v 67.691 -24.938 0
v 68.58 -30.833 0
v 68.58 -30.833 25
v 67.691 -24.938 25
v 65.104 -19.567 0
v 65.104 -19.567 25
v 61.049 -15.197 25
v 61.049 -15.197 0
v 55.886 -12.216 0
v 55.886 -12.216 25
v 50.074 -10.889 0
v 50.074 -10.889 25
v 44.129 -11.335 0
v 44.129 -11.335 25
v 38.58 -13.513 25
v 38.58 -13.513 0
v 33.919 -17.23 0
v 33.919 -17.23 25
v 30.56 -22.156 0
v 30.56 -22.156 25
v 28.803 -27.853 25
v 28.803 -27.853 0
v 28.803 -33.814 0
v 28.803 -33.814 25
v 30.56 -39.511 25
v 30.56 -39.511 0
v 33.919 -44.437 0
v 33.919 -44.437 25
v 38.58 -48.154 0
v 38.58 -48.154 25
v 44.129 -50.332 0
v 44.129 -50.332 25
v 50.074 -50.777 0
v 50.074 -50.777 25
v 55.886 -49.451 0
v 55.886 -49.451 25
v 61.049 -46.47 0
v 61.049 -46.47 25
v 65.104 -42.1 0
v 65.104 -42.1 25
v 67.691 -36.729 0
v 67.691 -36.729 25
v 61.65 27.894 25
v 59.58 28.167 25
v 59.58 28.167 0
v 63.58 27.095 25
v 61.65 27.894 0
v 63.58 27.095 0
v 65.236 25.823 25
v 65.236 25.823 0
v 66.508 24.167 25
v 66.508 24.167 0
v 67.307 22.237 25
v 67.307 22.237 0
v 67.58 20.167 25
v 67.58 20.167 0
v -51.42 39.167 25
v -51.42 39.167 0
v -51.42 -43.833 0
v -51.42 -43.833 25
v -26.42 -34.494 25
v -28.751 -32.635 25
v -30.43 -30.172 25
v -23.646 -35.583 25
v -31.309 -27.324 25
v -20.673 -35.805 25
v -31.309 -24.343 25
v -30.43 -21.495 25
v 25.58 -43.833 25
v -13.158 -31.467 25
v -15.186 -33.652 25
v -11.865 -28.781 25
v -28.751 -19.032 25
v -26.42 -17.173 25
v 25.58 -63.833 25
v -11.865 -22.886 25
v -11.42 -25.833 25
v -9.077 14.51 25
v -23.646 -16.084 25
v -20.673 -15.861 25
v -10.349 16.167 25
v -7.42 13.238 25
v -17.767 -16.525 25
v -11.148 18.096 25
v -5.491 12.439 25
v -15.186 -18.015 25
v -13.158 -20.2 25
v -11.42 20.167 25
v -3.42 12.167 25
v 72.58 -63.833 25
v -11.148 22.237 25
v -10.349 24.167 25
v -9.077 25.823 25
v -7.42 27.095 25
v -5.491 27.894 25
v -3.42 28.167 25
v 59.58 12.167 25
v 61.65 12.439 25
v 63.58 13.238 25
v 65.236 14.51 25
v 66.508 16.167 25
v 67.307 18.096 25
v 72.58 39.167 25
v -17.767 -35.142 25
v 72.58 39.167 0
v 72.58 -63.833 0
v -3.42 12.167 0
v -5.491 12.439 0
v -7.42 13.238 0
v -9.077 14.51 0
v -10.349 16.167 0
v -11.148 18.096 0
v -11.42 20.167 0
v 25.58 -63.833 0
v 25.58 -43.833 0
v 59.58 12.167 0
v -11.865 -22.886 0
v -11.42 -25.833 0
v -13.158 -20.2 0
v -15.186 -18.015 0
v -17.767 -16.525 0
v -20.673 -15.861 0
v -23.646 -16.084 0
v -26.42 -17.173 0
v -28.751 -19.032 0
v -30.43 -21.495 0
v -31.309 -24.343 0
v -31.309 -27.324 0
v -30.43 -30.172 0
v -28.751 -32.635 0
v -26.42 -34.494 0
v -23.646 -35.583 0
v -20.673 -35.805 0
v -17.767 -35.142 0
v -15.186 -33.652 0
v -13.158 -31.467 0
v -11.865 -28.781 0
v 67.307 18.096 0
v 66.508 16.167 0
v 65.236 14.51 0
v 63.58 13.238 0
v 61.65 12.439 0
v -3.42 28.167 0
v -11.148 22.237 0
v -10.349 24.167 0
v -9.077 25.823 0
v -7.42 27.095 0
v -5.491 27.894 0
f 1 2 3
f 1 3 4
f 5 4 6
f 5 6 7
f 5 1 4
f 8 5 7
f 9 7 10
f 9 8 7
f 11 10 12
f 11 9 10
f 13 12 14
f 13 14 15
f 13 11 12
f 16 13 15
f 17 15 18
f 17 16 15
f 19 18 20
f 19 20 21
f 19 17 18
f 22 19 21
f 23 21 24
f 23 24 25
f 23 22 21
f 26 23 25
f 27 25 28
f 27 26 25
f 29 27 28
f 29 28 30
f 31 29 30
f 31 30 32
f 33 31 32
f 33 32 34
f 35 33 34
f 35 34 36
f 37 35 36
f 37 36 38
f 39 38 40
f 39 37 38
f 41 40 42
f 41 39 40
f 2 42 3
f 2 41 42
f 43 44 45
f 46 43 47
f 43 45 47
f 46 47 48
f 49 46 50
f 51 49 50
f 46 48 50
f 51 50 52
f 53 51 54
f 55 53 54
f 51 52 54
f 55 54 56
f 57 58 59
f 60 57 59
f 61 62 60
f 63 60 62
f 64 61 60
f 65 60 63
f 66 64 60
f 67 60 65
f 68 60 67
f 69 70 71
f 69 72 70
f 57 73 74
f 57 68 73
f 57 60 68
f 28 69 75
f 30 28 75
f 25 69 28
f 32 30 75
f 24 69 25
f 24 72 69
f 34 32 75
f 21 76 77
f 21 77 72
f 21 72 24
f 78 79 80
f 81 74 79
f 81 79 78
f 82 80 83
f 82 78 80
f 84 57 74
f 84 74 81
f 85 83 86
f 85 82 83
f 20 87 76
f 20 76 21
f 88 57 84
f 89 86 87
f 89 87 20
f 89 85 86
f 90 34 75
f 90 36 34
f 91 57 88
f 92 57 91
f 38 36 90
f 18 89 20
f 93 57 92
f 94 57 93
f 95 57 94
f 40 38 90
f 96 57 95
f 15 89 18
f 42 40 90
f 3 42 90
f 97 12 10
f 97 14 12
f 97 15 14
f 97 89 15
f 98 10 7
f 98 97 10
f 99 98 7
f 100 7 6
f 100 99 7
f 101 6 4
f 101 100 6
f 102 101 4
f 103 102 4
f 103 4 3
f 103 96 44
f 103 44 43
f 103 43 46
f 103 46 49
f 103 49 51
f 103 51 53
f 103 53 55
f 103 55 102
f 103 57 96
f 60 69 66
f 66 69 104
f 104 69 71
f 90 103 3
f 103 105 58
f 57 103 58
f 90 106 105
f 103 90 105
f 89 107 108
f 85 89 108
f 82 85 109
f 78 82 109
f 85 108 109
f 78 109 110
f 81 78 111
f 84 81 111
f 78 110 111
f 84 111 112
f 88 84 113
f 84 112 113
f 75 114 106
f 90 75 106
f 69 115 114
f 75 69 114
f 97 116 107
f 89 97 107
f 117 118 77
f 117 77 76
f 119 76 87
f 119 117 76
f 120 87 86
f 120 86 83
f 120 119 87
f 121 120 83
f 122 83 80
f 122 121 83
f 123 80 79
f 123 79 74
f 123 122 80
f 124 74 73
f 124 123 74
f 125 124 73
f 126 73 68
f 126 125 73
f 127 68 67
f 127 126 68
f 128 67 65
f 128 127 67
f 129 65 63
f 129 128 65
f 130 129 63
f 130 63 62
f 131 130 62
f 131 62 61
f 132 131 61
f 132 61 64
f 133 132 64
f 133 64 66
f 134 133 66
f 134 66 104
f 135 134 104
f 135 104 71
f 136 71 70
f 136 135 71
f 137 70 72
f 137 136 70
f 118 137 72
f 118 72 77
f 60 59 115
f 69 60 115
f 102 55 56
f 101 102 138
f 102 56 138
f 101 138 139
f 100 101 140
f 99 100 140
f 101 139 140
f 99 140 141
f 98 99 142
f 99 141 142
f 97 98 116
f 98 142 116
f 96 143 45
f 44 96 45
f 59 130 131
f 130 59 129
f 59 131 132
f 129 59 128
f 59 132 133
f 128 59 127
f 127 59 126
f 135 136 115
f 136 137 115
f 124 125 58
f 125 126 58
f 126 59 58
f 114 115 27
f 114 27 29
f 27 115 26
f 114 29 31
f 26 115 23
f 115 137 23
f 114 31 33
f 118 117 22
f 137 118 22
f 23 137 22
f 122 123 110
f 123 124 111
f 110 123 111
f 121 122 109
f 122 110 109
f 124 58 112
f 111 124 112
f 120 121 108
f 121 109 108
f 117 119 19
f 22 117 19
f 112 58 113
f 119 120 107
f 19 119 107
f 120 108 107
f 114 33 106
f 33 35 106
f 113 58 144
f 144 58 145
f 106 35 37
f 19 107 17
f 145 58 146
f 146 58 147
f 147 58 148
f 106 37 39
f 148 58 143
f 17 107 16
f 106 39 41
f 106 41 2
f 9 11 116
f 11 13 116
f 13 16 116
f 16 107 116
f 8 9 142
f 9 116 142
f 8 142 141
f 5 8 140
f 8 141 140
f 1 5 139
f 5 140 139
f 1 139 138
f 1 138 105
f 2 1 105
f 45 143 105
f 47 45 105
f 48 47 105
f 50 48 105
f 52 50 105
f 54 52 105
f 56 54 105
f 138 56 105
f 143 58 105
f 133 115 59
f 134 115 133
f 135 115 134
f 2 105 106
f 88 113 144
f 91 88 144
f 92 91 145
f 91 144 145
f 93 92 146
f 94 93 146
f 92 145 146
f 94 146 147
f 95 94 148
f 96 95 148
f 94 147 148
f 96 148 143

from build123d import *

# Parameters (mm, degrees)
F0_R     = 10
F0_R_2   = 20
F1_DEPTH = 25


with BuildPart() as f1:
    # F0 (on Top) → F1 (new body)
    with BuildSketch(Plane.XY):
        Polygon((72.579548, 39.166598), (-51.420452, 39.166598), (-51.420452, -25.833402), (-51.420452, -43.833402), (-21.420452, -43.833402), (25.579548, -43.833402), (25.579548, -63.833402), (49.079548, -63.833402), (72.579548, -63.833402), (72.579548, 25.166598), align=None)
        with Locations((-21.420452, -25.833402)):
            Circle(F0_R, mode=Mode.SUBTRACT)
        with Locations((48.579548, -30.833402)):
            Circle(F0_R_2, mode=Mode.SUBTRACT)
        with BuildLine():
            Line((-3.420452, 28.166598), (59.579548, 28.166598))
            ThreePointArc((59.579548, 28.166598), (65.236402, 25.823453), (67.579548, 20.166598))
            ThreePointArc((67.579548, 20.166598), (65.236402, 14.509744), (59.579548, 12.166598))
            Line((59.579548, 12.166598), (-3.420452, 12.166598))
            ThreePointArc((-3.420452, 12.166598), (-9.077307, 14.509744), (-11.420452, 20.166598))
            ThreePointArc((-11.420452, 20.166598), (-9.077307, 25.823453), (-3.420452, 28.166598))
        make_face(mode=Mode.SUBTRACT)
    extrude(amount=F1_DEPTH)


solid = f1.part
